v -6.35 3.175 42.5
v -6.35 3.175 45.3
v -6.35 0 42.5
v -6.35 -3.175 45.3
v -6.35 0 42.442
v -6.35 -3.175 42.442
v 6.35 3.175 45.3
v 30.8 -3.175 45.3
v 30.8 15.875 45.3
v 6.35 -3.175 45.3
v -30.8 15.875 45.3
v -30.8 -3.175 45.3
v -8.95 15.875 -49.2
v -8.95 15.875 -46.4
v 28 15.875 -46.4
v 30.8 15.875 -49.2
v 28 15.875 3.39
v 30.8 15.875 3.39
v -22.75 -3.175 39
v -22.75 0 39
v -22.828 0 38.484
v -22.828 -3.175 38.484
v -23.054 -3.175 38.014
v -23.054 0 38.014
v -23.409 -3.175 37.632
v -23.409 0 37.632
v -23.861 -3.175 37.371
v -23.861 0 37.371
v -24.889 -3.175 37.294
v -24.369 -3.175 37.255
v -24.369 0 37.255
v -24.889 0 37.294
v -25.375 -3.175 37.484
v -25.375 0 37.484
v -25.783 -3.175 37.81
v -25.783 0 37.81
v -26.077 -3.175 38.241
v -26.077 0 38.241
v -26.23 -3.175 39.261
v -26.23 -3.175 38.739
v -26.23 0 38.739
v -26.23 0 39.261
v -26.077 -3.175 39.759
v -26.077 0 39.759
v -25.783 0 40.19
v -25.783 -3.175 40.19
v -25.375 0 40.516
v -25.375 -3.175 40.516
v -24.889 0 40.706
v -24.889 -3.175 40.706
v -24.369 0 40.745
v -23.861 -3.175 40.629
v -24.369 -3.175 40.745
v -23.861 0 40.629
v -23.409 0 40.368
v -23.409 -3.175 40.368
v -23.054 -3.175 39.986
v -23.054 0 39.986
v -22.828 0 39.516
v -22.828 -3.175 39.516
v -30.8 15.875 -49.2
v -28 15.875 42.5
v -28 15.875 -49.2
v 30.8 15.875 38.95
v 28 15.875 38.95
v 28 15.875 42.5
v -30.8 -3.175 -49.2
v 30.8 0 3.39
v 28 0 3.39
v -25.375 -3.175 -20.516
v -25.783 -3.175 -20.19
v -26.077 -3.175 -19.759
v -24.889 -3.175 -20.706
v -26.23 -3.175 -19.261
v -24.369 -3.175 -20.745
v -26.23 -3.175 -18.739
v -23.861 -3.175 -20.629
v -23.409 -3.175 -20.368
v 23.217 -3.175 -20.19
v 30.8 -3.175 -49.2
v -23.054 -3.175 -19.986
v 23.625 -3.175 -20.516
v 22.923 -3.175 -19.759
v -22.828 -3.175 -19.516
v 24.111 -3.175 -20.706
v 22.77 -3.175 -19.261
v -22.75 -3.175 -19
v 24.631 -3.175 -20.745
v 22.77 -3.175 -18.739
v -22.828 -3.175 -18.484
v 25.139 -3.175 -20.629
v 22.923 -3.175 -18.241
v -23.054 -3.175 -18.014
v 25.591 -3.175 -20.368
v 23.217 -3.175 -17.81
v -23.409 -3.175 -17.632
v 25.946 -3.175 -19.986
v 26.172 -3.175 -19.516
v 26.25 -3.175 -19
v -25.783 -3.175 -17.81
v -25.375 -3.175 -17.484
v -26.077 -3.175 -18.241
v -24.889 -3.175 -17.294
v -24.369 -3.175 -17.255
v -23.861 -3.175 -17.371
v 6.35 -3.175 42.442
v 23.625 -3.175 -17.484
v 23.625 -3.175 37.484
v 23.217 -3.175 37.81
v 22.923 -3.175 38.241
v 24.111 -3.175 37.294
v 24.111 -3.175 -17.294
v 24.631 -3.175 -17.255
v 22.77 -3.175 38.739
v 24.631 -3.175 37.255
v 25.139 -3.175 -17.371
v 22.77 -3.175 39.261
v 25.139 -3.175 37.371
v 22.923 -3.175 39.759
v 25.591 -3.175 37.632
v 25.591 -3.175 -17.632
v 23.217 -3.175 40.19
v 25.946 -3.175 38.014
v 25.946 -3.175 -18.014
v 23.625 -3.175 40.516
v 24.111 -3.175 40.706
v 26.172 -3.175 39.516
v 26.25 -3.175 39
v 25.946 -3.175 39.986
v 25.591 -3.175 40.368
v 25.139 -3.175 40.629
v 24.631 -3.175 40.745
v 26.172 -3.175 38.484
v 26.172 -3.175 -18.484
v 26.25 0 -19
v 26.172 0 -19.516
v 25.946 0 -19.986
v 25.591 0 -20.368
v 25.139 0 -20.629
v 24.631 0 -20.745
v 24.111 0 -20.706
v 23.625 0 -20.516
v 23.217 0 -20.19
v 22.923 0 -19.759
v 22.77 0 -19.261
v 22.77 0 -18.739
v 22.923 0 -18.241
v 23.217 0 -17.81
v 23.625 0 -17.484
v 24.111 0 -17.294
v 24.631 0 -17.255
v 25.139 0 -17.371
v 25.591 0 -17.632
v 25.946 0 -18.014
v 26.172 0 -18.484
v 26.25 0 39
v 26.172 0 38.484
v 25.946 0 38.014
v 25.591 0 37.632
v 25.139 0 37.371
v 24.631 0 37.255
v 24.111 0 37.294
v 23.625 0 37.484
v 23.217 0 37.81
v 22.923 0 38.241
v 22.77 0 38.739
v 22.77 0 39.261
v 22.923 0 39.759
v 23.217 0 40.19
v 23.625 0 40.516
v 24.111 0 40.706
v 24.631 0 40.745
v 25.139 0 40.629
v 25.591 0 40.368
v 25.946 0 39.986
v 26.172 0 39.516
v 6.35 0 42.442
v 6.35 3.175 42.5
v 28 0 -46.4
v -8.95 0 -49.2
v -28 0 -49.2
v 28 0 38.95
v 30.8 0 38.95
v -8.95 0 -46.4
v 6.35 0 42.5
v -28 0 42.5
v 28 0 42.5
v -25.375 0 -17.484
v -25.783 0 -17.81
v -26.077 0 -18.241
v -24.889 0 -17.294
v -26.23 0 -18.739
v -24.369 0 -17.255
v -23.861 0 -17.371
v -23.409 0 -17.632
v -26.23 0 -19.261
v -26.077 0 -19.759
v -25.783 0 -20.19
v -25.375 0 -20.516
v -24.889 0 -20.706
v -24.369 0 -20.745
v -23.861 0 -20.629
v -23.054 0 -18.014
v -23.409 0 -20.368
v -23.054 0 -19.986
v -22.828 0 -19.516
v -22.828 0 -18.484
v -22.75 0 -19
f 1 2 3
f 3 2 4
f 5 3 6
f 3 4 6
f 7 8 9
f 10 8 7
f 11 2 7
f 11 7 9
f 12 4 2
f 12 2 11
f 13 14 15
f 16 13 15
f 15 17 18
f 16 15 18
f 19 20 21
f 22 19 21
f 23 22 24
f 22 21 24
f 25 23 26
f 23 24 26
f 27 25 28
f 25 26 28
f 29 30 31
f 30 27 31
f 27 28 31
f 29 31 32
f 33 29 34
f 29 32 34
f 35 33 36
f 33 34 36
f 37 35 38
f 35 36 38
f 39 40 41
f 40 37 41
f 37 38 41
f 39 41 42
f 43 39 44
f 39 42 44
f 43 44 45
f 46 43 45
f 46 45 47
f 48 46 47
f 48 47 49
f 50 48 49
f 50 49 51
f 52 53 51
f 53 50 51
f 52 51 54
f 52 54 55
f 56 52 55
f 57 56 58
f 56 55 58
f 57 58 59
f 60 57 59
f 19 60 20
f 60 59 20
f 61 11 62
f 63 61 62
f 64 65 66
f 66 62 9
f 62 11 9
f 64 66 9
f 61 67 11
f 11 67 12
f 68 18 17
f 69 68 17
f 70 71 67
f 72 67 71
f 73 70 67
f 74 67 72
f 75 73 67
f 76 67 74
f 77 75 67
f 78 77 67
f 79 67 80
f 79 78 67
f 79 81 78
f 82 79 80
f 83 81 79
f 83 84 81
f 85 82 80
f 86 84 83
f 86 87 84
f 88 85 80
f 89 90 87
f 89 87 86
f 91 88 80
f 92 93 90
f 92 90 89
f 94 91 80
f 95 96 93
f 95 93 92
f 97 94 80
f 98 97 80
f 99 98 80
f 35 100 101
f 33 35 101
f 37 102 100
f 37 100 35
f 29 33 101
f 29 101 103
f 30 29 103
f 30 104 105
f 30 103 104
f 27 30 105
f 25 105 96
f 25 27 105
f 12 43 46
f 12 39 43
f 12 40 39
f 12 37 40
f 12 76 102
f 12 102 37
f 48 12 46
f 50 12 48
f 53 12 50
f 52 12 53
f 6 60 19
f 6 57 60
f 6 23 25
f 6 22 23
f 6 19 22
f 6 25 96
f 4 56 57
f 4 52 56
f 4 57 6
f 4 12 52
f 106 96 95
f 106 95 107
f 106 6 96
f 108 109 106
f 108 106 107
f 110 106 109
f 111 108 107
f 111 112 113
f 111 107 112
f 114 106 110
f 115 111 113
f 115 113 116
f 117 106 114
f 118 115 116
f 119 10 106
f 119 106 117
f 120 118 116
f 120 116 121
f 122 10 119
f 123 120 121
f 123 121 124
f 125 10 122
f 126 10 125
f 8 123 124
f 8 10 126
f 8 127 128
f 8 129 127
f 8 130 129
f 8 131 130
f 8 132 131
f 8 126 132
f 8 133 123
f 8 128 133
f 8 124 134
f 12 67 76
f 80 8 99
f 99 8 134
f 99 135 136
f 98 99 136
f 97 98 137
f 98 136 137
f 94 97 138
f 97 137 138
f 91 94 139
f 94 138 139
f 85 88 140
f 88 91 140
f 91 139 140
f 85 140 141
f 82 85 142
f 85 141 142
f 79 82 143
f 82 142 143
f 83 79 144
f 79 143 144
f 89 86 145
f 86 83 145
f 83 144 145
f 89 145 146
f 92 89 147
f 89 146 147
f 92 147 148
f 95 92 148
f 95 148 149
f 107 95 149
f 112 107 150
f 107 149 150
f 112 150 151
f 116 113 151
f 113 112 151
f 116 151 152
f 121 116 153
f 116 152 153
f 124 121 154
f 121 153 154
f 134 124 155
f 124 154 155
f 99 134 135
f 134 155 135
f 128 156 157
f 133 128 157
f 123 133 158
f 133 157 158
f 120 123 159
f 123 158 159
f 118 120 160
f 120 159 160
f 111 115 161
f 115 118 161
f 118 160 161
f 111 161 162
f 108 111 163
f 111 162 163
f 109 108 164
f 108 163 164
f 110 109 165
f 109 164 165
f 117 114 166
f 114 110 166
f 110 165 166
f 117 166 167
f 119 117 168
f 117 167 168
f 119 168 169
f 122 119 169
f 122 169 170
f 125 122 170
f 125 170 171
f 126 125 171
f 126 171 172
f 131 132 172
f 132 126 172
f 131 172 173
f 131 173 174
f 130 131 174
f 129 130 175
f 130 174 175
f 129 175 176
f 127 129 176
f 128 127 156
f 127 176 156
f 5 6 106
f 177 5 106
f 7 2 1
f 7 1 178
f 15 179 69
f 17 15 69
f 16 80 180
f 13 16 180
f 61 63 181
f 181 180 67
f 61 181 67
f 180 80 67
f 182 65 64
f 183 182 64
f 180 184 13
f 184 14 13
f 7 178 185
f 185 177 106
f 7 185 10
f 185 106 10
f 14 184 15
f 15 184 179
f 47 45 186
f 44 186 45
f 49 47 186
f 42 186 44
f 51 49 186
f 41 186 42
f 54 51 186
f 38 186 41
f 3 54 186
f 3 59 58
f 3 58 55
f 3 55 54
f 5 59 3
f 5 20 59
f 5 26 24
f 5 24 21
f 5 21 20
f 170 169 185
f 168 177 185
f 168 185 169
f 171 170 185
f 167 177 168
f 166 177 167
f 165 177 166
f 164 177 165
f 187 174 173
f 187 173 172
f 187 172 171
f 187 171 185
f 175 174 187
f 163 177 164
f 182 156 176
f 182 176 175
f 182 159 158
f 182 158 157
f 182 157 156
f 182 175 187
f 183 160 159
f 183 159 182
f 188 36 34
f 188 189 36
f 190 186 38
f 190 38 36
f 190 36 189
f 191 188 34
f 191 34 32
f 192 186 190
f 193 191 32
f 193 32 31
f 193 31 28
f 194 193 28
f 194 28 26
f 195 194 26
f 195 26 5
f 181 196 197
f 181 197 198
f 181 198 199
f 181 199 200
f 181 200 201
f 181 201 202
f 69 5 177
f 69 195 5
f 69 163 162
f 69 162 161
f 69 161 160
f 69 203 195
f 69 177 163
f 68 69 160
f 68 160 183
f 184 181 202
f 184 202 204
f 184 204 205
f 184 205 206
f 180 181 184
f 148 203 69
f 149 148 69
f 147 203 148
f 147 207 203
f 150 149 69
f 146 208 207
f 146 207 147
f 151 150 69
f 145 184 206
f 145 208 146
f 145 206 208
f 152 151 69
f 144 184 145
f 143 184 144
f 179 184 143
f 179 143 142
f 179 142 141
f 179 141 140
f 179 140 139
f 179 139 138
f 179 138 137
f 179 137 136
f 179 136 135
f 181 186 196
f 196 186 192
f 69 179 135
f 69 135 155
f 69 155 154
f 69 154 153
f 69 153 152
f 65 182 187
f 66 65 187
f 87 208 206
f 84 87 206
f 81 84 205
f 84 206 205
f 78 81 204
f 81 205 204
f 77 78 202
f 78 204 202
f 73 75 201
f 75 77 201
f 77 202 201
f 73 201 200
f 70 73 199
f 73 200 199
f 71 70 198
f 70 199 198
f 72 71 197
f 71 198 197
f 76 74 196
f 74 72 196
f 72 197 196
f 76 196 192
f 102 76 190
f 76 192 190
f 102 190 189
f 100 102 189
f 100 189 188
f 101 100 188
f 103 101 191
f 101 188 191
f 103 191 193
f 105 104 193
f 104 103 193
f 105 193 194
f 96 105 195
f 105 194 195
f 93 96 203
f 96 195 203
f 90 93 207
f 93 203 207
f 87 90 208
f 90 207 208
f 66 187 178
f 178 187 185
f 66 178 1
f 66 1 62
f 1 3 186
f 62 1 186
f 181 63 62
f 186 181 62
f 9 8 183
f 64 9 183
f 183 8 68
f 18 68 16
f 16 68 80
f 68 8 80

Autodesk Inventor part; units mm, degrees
ref_plane "YZ Plane" through (0, 0, 0) normal (1, 0, 0) x (0, 1, 0)
ref_plane "XZ Plane" through (0, 0, 0) normal (0, 1, 0) x (-1, 0, 0)
ref_plane "Work Plane3" through (-25, 0, 42.5) normal (0, -1, 0) x (1, 0, 0)
sketch "Sketch1" plane through (-25, 0, 42.5) normal (0, -1, 0) x (1, 0, 0)
  line L0 (28.4781, -19.558) -> (28.4781, -33.5534) projected
  arc A0 (53, -3) -> (50, 0) centre (50, -3) ccw projected
  line L1 (0, 0) -> (50, 0) projected
  arc A1 (0, 0) -> (-3, -3) centre (0, -3) ccw projected
  line L2 (-3, -82) -> (-3, -3) projected
  arc A2 (-3, -82) -> (0, -85) centre (0, -82) ccw projected
  line L3 (50, -85) -> (0, -85) projected
  arc A3 (50, -85) -> (53, -82) centre (50, -82) ccw projected
  line L4 (53, -3) -> (53, -82) projected
  circle A4 centre (49.5, -61.5) radius 1.75 projected
  circle A5 centre (0.5, -61.5) radius 1.75 projected
  circle A6 centre (0.5, -3.5) radius 1.75 projected
  circle A7 centre (49.5, -3.5) radius 1.75 projected
  line L5 (-3, 0) -> (53, 0)
  line L6 (53, 0) -> (53, -88.9)
  line L7 (53, -88.9) -> (-3, -88.9)
  line L8 (-3, -88.9) -> (-3, 0)
  point P0 (25, -42.5)
  dimension "d0" = 88.9
extrude "Extrusion1" add sketch "Sketch1" along normal blind 3.175
sketch "Sketch2" plane through (-25, -3.175, 42.5) normal (0, -1, 0) x (1, 0, 0)
  circle A0 centre (49.5, -3.5) radius 1.75 projected
  circle A1 centre (0.5, -3.5) radius 1.75 projected
  circle A2 centre (0.5, -61.5) radius 1.75 projected
  circle A3 centre (49.5, -61.5) radius 1.75 projected
  line L0 (53, 0) -> (-3, 0) projected
  line L1 (-3, 0) -> (-3, -88.9) projected
  line L2 (-3, -88.9) -> (53, -88.9) projected
  line L3 (53, -88.9) -> (53, 0) projected
  line L4 (-3, -88.9) -> (53, -88.9) projected
  line L5 (55.8, 2.8) -> (55.8, -91.7)
  line L6 (-5.8, -91.7) -> (-5.8, 2.8)
  line L7 (53, 0) -> (55.8, 2.8)
  line L8 (53, 0) -> (58.3967, 0) construction
  line L9 (55.8, 2.8) -> (-5.8, 2.8)
  line L10 (53, -88.9) -> (61.5609, -88.9) construction
  line L11 (55.8, -91.7) -> (-5.8, -91.7)
  point P0 (25, -42.5)
  dimension "d3" = 45
extrude "Extrusion2" add sketch "Sketch2" against normal blind 19.05 contours L5 L11 L6 L9
sketch "Sketch3" plane through (-25, 15.875, 42.5) normal (0, 1, 0) x (1, 0, 0)
  line L0 (-3, 0) -> (-3, 88.9) projected
  line L1 (-3, 88.9) -> (53, 88.9) projected
  line L2 (53, 88.9) -> (53, 0) projected
  line L3 (53, 0) -> (-3, 0) projected
  line L4 (-5.8, -2.8) -> (55.8, -2.8) projected
  line L5 (55.8, -2.8) -> (55.8, 91.7) projected
  line L6 (55.8, 91.7) -> (-5.8, 91.7) projected
  line L7 (-5.8, 91.7) -> (-5.8, -2.8) projected
  line L8 (53, 3.55) -> (55.8, 3.55)
  line L9 (55.8, 3.55) -> (55.8, 39.11)
  line L10 (55.8, 39.11) -> (53, 39.11)
  line L11 (53, 39.11) -> (53, 3.55)
  point P0 (25, 42.5)
  dimension "d7" = 6.35
  dimension "d8" = 35.56
extrude "Extrusion3" cut sketch "Sketch3" against normal blind 15.875 contours L2 L10 L5 L8
sketch "Sketch4" plane through (-25, -3.175, 42.5) normal (0, -1, 0) x (1, 0, 0)
  line L0 (55.8, 2.8) -> (-5.8, 2.8) projected
  line L1 (18.65, -0.0575) -> (31.35, -0.0575)
  line L2 (31.35, -0.0575) -> (31.35, 2.8)
  line L3 (31.35, 2.8) -> (18.65, 2.8)
  line L4 (18.65, 2.8) -> (18.65, -0.0575)
  line L5 (25, 21.7) -> (25, -110.6) projected
  point P0 (25, -42.5)
  dimension "d11" = 12.7
  dimension "d12" = 2.8575
extrude "Extrusion4" cut sketch "Sketch4" against normal blind 6.35
sketch "Sketch5" plane through (-25, 15.875, 42.5) normal (0, 1, 0) x (1, 0, 0)
  line L0 (-3, 88.9) -> (16.05, 88.9)
  line L1 (16.05, 88.9) -> (16.05, 91.7575)
  line L2 (16.05, 91.7575) -> (-3, 91.7575)
  line L3 (-3, 91.7575) -> (-3, 88.9)
  line L4 (55.8, 3.55) -> (53, 3.55) projected
  line L5 (53, 3.55) -> (53, 0) projected
  line L6 (53, 0) -> (-3, 0) projected
  line L7 (-3, 0) -> (-3, 88.9) projected
  line L8 (-3, 88.9) -> (53, 88.9) projected
  line L9 (53, 88.9) -> (53, 39.11) projected
  line L10 (53, 39.11) -> (55.8, 39.11) projected
  line L11 (55.8, 39.11) -> (55.8, 91.7) projected
  line L12 (55.8, 91.7) -> (-5.8, 91.7) projected
  line L13 (-5.8, 91.7) -> (-5.8, -2.8) projected
  line L14 (-5.8, -2.8) -> (55.8, -2.8) projected
  line L15 (55.8, -2.8) -> (55.8, 3.55) projected
  point P0 (25, 42.5)
  dimension "d15" = 19.05
  dimension "d16" = 2.8575
  dimension "d17" = 0
extrude "Extrusion5" cut sketch "Sketch5" against normal blind 15.875 contours L3 L12 L1 L0 | L3 L2 L1 L12
properties part number "Raspi3B+_Case"
